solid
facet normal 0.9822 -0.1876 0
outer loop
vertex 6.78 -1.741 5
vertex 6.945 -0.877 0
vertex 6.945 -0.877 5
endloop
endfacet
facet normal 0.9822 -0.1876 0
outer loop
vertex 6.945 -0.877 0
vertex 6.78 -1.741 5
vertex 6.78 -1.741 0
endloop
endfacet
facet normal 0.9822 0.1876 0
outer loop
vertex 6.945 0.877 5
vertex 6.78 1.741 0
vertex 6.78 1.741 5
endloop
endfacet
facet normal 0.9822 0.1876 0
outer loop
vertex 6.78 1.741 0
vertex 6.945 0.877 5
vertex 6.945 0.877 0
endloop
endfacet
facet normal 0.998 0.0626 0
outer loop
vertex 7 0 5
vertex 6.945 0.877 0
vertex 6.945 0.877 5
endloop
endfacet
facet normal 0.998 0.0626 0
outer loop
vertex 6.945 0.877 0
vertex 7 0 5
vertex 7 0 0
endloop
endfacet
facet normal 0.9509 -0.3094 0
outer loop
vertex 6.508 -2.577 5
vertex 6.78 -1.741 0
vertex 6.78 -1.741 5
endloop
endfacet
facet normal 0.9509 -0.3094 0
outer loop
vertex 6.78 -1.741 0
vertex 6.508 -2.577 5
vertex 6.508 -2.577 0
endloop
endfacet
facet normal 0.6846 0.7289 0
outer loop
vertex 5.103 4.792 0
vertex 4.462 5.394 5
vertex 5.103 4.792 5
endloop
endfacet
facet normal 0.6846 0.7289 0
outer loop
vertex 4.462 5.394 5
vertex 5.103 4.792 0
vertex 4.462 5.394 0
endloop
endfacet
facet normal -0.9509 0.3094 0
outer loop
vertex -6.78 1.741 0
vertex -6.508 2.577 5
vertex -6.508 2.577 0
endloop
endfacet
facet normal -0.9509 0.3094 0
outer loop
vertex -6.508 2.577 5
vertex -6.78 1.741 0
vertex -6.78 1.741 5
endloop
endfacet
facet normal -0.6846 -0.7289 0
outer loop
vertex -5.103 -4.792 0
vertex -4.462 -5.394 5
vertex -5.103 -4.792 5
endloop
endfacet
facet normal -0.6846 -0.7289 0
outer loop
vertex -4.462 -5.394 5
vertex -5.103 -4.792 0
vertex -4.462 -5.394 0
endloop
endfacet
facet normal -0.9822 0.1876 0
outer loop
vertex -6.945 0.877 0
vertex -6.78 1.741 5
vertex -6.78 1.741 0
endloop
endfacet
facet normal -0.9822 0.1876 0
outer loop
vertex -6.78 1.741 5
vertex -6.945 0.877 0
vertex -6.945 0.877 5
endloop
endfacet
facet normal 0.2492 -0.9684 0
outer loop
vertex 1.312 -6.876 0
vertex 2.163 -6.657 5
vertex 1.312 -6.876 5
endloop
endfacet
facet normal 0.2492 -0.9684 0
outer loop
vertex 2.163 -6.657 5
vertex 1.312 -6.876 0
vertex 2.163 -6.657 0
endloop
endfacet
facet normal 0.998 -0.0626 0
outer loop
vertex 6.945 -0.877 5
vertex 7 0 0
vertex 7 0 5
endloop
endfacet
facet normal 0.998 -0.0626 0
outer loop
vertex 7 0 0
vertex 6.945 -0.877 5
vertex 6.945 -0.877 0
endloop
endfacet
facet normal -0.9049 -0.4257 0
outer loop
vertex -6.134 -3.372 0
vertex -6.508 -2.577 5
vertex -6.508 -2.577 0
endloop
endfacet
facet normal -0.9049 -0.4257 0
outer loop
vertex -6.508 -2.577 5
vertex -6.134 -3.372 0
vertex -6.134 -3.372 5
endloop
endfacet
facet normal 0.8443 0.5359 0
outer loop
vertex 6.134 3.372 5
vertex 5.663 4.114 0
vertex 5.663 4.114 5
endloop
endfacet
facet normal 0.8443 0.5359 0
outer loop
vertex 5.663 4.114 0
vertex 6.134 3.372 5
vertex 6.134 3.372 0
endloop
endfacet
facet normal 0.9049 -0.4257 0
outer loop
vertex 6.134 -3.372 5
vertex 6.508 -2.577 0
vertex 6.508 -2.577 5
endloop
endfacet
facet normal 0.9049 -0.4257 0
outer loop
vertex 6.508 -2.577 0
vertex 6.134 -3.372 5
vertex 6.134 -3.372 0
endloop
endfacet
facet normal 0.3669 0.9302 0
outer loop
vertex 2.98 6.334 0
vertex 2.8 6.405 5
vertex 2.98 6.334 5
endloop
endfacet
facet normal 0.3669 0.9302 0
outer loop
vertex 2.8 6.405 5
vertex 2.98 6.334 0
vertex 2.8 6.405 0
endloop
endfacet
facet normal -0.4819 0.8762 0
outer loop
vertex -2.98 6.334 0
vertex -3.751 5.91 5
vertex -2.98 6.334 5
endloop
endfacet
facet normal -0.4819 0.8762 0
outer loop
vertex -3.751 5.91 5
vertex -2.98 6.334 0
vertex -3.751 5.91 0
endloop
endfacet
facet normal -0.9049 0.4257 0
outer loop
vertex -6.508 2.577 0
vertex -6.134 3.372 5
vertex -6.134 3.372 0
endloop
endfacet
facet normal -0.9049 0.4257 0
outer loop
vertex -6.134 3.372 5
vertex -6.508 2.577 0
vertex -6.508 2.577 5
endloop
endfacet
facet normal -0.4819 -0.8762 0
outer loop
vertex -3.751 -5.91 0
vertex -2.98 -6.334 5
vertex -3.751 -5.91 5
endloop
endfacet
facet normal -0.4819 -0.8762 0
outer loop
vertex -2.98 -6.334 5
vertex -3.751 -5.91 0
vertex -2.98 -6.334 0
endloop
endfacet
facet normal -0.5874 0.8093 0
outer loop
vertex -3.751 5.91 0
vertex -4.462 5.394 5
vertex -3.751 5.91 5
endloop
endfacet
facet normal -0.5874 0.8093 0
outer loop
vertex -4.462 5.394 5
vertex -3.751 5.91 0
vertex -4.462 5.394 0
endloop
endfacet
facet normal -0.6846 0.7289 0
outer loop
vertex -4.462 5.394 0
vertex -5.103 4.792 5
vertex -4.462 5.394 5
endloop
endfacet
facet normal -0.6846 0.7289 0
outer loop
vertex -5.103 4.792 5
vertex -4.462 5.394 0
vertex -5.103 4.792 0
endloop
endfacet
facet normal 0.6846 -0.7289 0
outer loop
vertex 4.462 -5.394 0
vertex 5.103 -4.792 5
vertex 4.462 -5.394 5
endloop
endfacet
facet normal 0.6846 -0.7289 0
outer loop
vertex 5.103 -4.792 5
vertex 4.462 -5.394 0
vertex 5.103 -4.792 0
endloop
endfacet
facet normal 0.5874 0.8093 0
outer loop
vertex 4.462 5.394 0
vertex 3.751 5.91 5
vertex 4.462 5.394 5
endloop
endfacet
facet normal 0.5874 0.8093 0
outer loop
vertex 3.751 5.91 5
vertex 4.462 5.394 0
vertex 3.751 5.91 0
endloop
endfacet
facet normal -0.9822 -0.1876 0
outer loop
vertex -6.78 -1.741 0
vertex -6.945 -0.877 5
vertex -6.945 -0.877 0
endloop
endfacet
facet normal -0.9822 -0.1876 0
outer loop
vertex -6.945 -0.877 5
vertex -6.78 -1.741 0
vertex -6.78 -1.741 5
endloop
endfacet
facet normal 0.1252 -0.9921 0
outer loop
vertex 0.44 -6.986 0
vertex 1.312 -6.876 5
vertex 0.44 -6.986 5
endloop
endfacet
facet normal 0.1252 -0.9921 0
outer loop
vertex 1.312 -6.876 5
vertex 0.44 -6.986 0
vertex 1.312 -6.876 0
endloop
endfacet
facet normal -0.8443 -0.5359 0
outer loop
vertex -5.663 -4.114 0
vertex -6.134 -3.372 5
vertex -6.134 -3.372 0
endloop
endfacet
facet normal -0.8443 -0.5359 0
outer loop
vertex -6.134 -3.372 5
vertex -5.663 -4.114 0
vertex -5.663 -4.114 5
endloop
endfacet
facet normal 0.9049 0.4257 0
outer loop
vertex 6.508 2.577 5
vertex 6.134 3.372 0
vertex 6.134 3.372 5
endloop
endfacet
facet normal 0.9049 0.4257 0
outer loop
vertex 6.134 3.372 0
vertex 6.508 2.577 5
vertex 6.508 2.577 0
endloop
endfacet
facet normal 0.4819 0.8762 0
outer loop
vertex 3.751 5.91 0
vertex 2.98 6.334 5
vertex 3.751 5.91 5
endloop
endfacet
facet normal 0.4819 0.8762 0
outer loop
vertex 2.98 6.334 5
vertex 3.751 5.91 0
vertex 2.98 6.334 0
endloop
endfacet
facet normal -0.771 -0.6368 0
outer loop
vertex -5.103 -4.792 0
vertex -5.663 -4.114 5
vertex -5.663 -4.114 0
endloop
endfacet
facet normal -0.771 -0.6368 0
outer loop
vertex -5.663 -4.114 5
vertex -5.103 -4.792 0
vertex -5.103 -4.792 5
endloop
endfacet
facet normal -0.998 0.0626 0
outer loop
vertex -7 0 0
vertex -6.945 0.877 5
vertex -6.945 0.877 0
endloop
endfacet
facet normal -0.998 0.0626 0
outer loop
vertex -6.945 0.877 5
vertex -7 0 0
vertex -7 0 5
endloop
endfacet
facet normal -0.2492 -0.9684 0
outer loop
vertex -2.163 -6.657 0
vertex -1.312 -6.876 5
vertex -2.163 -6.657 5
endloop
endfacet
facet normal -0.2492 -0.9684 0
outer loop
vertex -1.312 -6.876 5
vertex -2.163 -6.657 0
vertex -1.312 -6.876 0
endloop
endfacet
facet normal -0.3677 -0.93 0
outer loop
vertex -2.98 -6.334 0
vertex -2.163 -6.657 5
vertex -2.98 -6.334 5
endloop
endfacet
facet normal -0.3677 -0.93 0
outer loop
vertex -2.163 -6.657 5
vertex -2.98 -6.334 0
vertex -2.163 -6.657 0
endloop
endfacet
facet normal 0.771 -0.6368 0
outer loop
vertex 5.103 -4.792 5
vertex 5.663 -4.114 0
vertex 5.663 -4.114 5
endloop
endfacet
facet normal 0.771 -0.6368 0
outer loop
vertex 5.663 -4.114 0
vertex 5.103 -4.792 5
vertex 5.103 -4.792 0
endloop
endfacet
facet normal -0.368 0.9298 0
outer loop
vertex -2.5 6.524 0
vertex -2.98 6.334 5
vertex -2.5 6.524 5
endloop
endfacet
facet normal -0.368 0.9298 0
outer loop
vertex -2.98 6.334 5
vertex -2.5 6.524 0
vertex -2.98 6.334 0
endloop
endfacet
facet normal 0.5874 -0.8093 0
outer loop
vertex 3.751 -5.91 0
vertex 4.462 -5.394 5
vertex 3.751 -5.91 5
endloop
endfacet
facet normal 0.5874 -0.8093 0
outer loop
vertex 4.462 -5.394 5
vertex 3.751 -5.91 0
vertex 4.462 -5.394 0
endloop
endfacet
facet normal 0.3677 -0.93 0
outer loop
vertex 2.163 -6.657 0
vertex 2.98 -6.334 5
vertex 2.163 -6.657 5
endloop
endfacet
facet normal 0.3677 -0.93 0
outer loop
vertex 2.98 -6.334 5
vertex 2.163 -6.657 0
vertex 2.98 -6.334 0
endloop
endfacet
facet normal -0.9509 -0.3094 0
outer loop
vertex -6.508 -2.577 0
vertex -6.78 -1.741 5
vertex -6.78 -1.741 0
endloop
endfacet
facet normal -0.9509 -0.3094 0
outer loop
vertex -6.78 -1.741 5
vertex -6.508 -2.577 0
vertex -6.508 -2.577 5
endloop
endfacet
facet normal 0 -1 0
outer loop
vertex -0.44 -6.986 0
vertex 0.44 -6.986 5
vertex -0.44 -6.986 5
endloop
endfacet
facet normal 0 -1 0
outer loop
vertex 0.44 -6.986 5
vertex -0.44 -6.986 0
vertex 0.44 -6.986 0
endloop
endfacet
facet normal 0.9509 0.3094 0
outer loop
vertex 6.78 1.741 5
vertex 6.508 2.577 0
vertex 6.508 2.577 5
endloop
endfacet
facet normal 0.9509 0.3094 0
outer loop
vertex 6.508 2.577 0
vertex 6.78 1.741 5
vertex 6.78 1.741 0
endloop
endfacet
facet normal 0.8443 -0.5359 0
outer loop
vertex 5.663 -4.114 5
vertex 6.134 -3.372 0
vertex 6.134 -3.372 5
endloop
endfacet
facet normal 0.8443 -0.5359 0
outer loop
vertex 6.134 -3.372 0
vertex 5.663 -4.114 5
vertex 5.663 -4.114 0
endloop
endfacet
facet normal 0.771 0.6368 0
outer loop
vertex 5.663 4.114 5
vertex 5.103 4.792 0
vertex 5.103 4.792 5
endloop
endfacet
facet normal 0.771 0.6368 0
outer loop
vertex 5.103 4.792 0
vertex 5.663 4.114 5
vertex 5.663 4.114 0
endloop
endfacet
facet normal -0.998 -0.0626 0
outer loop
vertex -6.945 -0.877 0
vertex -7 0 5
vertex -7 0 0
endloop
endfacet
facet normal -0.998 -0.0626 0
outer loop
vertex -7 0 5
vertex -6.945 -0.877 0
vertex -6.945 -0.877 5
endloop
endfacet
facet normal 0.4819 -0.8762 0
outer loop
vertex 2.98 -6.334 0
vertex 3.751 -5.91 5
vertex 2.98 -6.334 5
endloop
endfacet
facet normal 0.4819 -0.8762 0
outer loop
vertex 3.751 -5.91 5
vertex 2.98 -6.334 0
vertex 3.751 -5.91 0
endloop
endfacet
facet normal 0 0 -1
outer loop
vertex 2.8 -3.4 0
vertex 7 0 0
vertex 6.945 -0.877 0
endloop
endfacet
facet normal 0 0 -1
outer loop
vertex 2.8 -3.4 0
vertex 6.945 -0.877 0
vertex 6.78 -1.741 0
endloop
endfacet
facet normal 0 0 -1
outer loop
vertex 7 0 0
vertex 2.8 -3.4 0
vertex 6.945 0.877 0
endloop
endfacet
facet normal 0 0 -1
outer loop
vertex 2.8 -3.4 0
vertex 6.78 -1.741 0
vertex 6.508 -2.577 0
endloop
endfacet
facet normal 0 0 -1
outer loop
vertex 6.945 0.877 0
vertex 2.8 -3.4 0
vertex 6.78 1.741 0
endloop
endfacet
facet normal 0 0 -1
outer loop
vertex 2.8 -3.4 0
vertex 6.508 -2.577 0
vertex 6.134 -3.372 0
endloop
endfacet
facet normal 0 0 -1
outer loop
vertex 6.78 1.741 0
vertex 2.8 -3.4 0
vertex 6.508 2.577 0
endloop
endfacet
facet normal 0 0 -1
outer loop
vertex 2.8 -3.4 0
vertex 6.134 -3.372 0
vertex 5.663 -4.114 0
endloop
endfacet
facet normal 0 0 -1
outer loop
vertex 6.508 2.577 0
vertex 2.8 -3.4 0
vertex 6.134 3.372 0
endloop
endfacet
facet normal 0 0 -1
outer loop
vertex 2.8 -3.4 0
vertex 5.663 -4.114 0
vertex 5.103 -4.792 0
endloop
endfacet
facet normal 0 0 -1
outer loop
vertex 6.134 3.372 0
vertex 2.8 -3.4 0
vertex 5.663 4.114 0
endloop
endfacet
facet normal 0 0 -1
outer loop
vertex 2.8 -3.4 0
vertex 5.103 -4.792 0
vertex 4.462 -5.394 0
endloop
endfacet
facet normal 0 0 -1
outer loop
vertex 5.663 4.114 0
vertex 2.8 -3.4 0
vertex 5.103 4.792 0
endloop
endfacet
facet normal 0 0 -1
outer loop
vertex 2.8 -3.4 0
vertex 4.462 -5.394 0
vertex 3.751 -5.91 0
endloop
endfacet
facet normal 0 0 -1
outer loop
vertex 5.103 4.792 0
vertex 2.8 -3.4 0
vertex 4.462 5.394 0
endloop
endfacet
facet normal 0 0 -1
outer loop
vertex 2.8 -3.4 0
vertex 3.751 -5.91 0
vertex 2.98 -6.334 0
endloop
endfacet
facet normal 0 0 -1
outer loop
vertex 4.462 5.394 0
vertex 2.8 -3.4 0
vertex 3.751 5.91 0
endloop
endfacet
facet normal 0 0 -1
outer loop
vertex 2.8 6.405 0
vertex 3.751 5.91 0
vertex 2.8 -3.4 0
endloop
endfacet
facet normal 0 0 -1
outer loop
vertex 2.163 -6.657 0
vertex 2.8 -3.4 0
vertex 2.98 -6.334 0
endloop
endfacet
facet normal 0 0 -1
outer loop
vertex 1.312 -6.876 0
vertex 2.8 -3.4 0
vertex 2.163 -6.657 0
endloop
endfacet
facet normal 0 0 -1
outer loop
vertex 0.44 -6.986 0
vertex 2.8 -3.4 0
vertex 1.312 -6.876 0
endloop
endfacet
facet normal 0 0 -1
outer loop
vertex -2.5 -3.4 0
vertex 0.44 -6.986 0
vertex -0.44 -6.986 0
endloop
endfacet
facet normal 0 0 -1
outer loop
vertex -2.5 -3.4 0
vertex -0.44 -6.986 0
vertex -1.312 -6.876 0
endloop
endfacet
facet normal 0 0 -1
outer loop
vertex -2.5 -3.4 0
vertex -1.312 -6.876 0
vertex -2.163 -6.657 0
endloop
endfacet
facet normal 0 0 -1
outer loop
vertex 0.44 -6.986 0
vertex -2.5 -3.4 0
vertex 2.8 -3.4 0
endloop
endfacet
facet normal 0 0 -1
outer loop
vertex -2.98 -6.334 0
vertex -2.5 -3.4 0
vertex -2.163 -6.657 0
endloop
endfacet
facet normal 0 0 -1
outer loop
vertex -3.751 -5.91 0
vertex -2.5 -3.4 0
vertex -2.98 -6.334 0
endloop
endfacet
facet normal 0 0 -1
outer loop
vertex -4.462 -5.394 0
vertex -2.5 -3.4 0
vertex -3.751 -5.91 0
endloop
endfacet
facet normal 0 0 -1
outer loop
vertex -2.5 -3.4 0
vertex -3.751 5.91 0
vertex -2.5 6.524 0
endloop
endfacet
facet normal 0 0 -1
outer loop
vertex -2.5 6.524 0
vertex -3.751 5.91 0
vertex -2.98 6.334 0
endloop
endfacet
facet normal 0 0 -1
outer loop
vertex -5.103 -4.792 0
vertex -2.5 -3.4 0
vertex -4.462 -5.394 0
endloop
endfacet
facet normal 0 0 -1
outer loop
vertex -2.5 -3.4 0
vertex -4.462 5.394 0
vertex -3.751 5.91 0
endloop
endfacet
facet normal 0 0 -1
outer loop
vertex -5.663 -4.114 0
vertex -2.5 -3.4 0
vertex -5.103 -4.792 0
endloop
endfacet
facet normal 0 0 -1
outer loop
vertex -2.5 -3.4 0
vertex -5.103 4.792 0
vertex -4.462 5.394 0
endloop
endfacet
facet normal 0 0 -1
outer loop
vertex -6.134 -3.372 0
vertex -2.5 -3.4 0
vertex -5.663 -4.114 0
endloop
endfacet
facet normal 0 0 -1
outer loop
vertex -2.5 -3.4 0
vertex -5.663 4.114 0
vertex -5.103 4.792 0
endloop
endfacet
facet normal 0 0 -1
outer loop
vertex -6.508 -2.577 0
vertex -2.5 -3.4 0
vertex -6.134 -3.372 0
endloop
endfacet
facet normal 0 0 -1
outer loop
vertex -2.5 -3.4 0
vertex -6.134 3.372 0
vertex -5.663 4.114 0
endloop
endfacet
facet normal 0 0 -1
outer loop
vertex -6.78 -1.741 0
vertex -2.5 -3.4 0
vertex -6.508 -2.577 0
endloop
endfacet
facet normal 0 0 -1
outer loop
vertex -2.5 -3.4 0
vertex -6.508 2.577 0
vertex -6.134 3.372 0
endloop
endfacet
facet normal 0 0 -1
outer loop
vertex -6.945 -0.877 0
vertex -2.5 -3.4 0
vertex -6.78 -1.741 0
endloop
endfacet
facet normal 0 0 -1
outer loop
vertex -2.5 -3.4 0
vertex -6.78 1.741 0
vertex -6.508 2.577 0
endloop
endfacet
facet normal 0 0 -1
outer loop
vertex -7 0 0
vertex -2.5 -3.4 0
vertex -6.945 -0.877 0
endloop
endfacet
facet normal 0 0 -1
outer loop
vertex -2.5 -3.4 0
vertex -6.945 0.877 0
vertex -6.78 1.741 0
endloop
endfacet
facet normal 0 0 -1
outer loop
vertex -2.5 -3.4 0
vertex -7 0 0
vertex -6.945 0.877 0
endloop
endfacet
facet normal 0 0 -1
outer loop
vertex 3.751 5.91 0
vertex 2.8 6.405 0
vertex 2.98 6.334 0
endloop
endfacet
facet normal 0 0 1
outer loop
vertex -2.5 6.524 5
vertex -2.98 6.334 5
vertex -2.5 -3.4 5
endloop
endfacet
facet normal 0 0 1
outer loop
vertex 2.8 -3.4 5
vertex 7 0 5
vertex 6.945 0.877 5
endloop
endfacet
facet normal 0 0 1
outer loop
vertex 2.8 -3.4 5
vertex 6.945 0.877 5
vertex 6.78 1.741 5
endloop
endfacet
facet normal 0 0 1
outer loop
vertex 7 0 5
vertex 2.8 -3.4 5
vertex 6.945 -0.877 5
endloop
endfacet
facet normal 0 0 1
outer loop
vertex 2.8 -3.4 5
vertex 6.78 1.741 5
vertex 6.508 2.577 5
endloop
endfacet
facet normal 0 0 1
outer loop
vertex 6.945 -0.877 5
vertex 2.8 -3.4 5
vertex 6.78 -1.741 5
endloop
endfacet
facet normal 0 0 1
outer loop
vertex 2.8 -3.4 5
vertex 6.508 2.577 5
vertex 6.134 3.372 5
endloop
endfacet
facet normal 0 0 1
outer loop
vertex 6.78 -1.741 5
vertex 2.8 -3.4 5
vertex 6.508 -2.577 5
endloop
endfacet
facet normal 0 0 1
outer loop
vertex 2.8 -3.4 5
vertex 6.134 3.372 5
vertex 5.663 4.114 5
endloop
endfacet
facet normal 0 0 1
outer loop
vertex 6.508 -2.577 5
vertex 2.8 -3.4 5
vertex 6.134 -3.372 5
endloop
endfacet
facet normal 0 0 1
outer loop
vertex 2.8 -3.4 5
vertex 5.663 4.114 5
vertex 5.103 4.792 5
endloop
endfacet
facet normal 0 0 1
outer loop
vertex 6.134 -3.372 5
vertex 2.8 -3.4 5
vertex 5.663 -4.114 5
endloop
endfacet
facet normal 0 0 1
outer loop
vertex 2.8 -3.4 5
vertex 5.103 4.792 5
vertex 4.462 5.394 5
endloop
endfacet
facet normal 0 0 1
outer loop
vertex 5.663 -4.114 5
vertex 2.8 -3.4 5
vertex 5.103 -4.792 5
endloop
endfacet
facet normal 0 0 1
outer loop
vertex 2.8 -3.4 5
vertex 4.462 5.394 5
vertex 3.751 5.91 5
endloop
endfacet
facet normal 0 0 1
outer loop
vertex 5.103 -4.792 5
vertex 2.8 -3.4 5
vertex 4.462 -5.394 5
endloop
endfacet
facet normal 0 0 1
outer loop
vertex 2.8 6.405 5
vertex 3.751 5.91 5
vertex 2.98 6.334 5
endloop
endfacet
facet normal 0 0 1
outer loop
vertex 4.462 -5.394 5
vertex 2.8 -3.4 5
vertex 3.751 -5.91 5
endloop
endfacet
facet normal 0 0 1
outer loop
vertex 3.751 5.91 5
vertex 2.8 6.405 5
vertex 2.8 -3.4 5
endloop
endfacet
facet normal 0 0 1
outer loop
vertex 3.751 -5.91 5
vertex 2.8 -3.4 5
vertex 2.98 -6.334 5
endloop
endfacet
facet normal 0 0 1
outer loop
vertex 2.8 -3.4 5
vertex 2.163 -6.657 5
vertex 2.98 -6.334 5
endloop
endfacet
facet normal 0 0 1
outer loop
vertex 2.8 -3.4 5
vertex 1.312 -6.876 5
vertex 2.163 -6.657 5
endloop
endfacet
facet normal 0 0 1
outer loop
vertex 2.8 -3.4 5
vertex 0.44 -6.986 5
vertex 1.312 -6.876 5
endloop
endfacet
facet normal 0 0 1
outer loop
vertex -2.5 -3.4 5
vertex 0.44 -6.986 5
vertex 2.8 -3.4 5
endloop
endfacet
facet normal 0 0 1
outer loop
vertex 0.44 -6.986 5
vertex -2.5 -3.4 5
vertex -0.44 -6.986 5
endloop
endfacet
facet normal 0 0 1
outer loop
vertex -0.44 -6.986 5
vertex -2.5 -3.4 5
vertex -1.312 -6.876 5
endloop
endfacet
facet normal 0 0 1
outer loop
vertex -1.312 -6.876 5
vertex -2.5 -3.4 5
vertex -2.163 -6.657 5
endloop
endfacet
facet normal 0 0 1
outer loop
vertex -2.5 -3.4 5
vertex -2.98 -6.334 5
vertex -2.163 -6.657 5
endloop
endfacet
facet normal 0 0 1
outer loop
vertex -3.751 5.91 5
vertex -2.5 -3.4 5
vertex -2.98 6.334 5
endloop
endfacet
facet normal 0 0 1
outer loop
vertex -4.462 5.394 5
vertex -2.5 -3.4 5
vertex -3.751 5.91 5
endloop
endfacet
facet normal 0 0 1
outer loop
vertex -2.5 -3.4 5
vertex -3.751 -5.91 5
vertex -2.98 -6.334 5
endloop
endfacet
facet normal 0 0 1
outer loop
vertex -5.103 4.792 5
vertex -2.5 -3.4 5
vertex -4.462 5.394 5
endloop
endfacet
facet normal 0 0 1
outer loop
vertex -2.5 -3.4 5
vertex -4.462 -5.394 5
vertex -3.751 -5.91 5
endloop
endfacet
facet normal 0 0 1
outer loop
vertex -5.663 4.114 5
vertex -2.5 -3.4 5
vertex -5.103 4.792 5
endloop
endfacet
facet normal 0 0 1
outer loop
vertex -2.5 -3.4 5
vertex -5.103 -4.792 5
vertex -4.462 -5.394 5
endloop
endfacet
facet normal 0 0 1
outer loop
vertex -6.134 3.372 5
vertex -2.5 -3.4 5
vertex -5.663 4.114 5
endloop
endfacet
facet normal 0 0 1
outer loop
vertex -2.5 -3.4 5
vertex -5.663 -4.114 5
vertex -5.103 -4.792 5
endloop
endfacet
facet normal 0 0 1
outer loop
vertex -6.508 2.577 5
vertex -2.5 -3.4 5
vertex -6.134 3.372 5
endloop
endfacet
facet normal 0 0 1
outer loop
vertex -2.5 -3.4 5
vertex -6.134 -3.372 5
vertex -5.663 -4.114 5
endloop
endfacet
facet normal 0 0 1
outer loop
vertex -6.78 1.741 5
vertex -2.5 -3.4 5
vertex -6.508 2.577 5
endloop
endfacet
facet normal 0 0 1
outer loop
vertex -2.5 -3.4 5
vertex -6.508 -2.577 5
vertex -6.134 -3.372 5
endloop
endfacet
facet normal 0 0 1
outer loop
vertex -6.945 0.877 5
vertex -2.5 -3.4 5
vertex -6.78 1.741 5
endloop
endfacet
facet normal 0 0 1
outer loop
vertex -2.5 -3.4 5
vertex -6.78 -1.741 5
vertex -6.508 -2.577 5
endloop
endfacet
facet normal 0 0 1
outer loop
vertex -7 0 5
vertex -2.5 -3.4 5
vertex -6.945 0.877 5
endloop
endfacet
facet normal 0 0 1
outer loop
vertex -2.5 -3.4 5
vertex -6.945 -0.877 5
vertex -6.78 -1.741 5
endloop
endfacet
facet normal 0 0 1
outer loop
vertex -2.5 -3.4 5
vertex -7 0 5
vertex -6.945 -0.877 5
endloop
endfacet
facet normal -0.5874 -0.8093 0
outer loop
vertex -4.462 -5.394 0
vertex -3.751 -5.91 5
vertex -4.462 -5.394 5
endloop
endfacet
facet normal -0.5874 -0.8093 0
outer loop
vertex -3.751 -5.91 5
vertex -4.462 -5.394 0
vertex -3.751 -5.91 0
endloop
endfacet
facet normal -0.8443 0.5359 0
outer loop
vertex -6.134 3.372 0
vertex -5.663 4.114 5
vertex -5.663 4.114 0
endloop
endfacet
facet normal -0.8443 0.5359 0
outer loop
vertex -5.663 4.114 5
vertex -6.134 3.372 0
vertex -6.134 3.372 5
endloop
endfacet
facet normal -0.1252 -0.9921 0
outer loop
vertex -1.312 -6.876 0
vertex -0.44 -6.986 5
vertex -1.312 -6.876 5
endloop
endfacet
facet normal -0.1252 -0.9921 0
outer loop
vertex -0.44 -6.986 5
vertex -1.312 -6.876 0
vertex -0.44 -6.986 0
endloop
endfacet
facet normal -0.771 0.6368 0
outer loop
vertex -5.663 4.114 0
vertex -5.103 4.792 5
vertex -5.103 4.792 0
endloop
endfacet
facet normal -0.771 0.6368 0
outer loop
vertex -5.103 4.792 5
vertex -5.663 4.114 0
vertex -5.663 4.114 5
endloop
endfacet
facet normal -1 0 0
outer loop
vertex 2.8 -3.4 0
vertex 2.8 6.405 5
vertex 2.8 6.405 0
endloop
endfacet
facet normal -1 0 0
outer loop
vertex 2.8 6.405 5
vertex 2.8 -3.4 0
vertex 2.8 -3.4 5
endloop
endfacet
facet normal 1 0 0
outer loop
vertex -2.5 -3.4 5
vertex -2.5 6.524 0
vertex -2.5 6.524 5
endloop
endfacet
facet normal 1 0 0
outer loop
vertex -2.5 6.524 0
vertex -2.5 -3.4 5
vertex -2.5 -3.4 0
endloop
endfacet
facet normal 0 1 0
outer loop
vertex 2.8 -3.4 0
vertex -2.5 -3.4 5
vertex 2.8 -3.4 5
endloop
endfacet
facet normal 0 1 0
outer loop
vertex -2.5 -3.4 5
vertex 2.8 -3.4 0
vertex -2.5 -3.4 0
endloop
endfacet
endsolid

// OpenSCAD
footLength = 5;
difference() {
  cylinder(footLength, r=7, $fn=50);
  translate(v=[-2.5, -3.4, -1]) {
    cube(size=[5.3, 12, footLength + 2]);
  }
}
